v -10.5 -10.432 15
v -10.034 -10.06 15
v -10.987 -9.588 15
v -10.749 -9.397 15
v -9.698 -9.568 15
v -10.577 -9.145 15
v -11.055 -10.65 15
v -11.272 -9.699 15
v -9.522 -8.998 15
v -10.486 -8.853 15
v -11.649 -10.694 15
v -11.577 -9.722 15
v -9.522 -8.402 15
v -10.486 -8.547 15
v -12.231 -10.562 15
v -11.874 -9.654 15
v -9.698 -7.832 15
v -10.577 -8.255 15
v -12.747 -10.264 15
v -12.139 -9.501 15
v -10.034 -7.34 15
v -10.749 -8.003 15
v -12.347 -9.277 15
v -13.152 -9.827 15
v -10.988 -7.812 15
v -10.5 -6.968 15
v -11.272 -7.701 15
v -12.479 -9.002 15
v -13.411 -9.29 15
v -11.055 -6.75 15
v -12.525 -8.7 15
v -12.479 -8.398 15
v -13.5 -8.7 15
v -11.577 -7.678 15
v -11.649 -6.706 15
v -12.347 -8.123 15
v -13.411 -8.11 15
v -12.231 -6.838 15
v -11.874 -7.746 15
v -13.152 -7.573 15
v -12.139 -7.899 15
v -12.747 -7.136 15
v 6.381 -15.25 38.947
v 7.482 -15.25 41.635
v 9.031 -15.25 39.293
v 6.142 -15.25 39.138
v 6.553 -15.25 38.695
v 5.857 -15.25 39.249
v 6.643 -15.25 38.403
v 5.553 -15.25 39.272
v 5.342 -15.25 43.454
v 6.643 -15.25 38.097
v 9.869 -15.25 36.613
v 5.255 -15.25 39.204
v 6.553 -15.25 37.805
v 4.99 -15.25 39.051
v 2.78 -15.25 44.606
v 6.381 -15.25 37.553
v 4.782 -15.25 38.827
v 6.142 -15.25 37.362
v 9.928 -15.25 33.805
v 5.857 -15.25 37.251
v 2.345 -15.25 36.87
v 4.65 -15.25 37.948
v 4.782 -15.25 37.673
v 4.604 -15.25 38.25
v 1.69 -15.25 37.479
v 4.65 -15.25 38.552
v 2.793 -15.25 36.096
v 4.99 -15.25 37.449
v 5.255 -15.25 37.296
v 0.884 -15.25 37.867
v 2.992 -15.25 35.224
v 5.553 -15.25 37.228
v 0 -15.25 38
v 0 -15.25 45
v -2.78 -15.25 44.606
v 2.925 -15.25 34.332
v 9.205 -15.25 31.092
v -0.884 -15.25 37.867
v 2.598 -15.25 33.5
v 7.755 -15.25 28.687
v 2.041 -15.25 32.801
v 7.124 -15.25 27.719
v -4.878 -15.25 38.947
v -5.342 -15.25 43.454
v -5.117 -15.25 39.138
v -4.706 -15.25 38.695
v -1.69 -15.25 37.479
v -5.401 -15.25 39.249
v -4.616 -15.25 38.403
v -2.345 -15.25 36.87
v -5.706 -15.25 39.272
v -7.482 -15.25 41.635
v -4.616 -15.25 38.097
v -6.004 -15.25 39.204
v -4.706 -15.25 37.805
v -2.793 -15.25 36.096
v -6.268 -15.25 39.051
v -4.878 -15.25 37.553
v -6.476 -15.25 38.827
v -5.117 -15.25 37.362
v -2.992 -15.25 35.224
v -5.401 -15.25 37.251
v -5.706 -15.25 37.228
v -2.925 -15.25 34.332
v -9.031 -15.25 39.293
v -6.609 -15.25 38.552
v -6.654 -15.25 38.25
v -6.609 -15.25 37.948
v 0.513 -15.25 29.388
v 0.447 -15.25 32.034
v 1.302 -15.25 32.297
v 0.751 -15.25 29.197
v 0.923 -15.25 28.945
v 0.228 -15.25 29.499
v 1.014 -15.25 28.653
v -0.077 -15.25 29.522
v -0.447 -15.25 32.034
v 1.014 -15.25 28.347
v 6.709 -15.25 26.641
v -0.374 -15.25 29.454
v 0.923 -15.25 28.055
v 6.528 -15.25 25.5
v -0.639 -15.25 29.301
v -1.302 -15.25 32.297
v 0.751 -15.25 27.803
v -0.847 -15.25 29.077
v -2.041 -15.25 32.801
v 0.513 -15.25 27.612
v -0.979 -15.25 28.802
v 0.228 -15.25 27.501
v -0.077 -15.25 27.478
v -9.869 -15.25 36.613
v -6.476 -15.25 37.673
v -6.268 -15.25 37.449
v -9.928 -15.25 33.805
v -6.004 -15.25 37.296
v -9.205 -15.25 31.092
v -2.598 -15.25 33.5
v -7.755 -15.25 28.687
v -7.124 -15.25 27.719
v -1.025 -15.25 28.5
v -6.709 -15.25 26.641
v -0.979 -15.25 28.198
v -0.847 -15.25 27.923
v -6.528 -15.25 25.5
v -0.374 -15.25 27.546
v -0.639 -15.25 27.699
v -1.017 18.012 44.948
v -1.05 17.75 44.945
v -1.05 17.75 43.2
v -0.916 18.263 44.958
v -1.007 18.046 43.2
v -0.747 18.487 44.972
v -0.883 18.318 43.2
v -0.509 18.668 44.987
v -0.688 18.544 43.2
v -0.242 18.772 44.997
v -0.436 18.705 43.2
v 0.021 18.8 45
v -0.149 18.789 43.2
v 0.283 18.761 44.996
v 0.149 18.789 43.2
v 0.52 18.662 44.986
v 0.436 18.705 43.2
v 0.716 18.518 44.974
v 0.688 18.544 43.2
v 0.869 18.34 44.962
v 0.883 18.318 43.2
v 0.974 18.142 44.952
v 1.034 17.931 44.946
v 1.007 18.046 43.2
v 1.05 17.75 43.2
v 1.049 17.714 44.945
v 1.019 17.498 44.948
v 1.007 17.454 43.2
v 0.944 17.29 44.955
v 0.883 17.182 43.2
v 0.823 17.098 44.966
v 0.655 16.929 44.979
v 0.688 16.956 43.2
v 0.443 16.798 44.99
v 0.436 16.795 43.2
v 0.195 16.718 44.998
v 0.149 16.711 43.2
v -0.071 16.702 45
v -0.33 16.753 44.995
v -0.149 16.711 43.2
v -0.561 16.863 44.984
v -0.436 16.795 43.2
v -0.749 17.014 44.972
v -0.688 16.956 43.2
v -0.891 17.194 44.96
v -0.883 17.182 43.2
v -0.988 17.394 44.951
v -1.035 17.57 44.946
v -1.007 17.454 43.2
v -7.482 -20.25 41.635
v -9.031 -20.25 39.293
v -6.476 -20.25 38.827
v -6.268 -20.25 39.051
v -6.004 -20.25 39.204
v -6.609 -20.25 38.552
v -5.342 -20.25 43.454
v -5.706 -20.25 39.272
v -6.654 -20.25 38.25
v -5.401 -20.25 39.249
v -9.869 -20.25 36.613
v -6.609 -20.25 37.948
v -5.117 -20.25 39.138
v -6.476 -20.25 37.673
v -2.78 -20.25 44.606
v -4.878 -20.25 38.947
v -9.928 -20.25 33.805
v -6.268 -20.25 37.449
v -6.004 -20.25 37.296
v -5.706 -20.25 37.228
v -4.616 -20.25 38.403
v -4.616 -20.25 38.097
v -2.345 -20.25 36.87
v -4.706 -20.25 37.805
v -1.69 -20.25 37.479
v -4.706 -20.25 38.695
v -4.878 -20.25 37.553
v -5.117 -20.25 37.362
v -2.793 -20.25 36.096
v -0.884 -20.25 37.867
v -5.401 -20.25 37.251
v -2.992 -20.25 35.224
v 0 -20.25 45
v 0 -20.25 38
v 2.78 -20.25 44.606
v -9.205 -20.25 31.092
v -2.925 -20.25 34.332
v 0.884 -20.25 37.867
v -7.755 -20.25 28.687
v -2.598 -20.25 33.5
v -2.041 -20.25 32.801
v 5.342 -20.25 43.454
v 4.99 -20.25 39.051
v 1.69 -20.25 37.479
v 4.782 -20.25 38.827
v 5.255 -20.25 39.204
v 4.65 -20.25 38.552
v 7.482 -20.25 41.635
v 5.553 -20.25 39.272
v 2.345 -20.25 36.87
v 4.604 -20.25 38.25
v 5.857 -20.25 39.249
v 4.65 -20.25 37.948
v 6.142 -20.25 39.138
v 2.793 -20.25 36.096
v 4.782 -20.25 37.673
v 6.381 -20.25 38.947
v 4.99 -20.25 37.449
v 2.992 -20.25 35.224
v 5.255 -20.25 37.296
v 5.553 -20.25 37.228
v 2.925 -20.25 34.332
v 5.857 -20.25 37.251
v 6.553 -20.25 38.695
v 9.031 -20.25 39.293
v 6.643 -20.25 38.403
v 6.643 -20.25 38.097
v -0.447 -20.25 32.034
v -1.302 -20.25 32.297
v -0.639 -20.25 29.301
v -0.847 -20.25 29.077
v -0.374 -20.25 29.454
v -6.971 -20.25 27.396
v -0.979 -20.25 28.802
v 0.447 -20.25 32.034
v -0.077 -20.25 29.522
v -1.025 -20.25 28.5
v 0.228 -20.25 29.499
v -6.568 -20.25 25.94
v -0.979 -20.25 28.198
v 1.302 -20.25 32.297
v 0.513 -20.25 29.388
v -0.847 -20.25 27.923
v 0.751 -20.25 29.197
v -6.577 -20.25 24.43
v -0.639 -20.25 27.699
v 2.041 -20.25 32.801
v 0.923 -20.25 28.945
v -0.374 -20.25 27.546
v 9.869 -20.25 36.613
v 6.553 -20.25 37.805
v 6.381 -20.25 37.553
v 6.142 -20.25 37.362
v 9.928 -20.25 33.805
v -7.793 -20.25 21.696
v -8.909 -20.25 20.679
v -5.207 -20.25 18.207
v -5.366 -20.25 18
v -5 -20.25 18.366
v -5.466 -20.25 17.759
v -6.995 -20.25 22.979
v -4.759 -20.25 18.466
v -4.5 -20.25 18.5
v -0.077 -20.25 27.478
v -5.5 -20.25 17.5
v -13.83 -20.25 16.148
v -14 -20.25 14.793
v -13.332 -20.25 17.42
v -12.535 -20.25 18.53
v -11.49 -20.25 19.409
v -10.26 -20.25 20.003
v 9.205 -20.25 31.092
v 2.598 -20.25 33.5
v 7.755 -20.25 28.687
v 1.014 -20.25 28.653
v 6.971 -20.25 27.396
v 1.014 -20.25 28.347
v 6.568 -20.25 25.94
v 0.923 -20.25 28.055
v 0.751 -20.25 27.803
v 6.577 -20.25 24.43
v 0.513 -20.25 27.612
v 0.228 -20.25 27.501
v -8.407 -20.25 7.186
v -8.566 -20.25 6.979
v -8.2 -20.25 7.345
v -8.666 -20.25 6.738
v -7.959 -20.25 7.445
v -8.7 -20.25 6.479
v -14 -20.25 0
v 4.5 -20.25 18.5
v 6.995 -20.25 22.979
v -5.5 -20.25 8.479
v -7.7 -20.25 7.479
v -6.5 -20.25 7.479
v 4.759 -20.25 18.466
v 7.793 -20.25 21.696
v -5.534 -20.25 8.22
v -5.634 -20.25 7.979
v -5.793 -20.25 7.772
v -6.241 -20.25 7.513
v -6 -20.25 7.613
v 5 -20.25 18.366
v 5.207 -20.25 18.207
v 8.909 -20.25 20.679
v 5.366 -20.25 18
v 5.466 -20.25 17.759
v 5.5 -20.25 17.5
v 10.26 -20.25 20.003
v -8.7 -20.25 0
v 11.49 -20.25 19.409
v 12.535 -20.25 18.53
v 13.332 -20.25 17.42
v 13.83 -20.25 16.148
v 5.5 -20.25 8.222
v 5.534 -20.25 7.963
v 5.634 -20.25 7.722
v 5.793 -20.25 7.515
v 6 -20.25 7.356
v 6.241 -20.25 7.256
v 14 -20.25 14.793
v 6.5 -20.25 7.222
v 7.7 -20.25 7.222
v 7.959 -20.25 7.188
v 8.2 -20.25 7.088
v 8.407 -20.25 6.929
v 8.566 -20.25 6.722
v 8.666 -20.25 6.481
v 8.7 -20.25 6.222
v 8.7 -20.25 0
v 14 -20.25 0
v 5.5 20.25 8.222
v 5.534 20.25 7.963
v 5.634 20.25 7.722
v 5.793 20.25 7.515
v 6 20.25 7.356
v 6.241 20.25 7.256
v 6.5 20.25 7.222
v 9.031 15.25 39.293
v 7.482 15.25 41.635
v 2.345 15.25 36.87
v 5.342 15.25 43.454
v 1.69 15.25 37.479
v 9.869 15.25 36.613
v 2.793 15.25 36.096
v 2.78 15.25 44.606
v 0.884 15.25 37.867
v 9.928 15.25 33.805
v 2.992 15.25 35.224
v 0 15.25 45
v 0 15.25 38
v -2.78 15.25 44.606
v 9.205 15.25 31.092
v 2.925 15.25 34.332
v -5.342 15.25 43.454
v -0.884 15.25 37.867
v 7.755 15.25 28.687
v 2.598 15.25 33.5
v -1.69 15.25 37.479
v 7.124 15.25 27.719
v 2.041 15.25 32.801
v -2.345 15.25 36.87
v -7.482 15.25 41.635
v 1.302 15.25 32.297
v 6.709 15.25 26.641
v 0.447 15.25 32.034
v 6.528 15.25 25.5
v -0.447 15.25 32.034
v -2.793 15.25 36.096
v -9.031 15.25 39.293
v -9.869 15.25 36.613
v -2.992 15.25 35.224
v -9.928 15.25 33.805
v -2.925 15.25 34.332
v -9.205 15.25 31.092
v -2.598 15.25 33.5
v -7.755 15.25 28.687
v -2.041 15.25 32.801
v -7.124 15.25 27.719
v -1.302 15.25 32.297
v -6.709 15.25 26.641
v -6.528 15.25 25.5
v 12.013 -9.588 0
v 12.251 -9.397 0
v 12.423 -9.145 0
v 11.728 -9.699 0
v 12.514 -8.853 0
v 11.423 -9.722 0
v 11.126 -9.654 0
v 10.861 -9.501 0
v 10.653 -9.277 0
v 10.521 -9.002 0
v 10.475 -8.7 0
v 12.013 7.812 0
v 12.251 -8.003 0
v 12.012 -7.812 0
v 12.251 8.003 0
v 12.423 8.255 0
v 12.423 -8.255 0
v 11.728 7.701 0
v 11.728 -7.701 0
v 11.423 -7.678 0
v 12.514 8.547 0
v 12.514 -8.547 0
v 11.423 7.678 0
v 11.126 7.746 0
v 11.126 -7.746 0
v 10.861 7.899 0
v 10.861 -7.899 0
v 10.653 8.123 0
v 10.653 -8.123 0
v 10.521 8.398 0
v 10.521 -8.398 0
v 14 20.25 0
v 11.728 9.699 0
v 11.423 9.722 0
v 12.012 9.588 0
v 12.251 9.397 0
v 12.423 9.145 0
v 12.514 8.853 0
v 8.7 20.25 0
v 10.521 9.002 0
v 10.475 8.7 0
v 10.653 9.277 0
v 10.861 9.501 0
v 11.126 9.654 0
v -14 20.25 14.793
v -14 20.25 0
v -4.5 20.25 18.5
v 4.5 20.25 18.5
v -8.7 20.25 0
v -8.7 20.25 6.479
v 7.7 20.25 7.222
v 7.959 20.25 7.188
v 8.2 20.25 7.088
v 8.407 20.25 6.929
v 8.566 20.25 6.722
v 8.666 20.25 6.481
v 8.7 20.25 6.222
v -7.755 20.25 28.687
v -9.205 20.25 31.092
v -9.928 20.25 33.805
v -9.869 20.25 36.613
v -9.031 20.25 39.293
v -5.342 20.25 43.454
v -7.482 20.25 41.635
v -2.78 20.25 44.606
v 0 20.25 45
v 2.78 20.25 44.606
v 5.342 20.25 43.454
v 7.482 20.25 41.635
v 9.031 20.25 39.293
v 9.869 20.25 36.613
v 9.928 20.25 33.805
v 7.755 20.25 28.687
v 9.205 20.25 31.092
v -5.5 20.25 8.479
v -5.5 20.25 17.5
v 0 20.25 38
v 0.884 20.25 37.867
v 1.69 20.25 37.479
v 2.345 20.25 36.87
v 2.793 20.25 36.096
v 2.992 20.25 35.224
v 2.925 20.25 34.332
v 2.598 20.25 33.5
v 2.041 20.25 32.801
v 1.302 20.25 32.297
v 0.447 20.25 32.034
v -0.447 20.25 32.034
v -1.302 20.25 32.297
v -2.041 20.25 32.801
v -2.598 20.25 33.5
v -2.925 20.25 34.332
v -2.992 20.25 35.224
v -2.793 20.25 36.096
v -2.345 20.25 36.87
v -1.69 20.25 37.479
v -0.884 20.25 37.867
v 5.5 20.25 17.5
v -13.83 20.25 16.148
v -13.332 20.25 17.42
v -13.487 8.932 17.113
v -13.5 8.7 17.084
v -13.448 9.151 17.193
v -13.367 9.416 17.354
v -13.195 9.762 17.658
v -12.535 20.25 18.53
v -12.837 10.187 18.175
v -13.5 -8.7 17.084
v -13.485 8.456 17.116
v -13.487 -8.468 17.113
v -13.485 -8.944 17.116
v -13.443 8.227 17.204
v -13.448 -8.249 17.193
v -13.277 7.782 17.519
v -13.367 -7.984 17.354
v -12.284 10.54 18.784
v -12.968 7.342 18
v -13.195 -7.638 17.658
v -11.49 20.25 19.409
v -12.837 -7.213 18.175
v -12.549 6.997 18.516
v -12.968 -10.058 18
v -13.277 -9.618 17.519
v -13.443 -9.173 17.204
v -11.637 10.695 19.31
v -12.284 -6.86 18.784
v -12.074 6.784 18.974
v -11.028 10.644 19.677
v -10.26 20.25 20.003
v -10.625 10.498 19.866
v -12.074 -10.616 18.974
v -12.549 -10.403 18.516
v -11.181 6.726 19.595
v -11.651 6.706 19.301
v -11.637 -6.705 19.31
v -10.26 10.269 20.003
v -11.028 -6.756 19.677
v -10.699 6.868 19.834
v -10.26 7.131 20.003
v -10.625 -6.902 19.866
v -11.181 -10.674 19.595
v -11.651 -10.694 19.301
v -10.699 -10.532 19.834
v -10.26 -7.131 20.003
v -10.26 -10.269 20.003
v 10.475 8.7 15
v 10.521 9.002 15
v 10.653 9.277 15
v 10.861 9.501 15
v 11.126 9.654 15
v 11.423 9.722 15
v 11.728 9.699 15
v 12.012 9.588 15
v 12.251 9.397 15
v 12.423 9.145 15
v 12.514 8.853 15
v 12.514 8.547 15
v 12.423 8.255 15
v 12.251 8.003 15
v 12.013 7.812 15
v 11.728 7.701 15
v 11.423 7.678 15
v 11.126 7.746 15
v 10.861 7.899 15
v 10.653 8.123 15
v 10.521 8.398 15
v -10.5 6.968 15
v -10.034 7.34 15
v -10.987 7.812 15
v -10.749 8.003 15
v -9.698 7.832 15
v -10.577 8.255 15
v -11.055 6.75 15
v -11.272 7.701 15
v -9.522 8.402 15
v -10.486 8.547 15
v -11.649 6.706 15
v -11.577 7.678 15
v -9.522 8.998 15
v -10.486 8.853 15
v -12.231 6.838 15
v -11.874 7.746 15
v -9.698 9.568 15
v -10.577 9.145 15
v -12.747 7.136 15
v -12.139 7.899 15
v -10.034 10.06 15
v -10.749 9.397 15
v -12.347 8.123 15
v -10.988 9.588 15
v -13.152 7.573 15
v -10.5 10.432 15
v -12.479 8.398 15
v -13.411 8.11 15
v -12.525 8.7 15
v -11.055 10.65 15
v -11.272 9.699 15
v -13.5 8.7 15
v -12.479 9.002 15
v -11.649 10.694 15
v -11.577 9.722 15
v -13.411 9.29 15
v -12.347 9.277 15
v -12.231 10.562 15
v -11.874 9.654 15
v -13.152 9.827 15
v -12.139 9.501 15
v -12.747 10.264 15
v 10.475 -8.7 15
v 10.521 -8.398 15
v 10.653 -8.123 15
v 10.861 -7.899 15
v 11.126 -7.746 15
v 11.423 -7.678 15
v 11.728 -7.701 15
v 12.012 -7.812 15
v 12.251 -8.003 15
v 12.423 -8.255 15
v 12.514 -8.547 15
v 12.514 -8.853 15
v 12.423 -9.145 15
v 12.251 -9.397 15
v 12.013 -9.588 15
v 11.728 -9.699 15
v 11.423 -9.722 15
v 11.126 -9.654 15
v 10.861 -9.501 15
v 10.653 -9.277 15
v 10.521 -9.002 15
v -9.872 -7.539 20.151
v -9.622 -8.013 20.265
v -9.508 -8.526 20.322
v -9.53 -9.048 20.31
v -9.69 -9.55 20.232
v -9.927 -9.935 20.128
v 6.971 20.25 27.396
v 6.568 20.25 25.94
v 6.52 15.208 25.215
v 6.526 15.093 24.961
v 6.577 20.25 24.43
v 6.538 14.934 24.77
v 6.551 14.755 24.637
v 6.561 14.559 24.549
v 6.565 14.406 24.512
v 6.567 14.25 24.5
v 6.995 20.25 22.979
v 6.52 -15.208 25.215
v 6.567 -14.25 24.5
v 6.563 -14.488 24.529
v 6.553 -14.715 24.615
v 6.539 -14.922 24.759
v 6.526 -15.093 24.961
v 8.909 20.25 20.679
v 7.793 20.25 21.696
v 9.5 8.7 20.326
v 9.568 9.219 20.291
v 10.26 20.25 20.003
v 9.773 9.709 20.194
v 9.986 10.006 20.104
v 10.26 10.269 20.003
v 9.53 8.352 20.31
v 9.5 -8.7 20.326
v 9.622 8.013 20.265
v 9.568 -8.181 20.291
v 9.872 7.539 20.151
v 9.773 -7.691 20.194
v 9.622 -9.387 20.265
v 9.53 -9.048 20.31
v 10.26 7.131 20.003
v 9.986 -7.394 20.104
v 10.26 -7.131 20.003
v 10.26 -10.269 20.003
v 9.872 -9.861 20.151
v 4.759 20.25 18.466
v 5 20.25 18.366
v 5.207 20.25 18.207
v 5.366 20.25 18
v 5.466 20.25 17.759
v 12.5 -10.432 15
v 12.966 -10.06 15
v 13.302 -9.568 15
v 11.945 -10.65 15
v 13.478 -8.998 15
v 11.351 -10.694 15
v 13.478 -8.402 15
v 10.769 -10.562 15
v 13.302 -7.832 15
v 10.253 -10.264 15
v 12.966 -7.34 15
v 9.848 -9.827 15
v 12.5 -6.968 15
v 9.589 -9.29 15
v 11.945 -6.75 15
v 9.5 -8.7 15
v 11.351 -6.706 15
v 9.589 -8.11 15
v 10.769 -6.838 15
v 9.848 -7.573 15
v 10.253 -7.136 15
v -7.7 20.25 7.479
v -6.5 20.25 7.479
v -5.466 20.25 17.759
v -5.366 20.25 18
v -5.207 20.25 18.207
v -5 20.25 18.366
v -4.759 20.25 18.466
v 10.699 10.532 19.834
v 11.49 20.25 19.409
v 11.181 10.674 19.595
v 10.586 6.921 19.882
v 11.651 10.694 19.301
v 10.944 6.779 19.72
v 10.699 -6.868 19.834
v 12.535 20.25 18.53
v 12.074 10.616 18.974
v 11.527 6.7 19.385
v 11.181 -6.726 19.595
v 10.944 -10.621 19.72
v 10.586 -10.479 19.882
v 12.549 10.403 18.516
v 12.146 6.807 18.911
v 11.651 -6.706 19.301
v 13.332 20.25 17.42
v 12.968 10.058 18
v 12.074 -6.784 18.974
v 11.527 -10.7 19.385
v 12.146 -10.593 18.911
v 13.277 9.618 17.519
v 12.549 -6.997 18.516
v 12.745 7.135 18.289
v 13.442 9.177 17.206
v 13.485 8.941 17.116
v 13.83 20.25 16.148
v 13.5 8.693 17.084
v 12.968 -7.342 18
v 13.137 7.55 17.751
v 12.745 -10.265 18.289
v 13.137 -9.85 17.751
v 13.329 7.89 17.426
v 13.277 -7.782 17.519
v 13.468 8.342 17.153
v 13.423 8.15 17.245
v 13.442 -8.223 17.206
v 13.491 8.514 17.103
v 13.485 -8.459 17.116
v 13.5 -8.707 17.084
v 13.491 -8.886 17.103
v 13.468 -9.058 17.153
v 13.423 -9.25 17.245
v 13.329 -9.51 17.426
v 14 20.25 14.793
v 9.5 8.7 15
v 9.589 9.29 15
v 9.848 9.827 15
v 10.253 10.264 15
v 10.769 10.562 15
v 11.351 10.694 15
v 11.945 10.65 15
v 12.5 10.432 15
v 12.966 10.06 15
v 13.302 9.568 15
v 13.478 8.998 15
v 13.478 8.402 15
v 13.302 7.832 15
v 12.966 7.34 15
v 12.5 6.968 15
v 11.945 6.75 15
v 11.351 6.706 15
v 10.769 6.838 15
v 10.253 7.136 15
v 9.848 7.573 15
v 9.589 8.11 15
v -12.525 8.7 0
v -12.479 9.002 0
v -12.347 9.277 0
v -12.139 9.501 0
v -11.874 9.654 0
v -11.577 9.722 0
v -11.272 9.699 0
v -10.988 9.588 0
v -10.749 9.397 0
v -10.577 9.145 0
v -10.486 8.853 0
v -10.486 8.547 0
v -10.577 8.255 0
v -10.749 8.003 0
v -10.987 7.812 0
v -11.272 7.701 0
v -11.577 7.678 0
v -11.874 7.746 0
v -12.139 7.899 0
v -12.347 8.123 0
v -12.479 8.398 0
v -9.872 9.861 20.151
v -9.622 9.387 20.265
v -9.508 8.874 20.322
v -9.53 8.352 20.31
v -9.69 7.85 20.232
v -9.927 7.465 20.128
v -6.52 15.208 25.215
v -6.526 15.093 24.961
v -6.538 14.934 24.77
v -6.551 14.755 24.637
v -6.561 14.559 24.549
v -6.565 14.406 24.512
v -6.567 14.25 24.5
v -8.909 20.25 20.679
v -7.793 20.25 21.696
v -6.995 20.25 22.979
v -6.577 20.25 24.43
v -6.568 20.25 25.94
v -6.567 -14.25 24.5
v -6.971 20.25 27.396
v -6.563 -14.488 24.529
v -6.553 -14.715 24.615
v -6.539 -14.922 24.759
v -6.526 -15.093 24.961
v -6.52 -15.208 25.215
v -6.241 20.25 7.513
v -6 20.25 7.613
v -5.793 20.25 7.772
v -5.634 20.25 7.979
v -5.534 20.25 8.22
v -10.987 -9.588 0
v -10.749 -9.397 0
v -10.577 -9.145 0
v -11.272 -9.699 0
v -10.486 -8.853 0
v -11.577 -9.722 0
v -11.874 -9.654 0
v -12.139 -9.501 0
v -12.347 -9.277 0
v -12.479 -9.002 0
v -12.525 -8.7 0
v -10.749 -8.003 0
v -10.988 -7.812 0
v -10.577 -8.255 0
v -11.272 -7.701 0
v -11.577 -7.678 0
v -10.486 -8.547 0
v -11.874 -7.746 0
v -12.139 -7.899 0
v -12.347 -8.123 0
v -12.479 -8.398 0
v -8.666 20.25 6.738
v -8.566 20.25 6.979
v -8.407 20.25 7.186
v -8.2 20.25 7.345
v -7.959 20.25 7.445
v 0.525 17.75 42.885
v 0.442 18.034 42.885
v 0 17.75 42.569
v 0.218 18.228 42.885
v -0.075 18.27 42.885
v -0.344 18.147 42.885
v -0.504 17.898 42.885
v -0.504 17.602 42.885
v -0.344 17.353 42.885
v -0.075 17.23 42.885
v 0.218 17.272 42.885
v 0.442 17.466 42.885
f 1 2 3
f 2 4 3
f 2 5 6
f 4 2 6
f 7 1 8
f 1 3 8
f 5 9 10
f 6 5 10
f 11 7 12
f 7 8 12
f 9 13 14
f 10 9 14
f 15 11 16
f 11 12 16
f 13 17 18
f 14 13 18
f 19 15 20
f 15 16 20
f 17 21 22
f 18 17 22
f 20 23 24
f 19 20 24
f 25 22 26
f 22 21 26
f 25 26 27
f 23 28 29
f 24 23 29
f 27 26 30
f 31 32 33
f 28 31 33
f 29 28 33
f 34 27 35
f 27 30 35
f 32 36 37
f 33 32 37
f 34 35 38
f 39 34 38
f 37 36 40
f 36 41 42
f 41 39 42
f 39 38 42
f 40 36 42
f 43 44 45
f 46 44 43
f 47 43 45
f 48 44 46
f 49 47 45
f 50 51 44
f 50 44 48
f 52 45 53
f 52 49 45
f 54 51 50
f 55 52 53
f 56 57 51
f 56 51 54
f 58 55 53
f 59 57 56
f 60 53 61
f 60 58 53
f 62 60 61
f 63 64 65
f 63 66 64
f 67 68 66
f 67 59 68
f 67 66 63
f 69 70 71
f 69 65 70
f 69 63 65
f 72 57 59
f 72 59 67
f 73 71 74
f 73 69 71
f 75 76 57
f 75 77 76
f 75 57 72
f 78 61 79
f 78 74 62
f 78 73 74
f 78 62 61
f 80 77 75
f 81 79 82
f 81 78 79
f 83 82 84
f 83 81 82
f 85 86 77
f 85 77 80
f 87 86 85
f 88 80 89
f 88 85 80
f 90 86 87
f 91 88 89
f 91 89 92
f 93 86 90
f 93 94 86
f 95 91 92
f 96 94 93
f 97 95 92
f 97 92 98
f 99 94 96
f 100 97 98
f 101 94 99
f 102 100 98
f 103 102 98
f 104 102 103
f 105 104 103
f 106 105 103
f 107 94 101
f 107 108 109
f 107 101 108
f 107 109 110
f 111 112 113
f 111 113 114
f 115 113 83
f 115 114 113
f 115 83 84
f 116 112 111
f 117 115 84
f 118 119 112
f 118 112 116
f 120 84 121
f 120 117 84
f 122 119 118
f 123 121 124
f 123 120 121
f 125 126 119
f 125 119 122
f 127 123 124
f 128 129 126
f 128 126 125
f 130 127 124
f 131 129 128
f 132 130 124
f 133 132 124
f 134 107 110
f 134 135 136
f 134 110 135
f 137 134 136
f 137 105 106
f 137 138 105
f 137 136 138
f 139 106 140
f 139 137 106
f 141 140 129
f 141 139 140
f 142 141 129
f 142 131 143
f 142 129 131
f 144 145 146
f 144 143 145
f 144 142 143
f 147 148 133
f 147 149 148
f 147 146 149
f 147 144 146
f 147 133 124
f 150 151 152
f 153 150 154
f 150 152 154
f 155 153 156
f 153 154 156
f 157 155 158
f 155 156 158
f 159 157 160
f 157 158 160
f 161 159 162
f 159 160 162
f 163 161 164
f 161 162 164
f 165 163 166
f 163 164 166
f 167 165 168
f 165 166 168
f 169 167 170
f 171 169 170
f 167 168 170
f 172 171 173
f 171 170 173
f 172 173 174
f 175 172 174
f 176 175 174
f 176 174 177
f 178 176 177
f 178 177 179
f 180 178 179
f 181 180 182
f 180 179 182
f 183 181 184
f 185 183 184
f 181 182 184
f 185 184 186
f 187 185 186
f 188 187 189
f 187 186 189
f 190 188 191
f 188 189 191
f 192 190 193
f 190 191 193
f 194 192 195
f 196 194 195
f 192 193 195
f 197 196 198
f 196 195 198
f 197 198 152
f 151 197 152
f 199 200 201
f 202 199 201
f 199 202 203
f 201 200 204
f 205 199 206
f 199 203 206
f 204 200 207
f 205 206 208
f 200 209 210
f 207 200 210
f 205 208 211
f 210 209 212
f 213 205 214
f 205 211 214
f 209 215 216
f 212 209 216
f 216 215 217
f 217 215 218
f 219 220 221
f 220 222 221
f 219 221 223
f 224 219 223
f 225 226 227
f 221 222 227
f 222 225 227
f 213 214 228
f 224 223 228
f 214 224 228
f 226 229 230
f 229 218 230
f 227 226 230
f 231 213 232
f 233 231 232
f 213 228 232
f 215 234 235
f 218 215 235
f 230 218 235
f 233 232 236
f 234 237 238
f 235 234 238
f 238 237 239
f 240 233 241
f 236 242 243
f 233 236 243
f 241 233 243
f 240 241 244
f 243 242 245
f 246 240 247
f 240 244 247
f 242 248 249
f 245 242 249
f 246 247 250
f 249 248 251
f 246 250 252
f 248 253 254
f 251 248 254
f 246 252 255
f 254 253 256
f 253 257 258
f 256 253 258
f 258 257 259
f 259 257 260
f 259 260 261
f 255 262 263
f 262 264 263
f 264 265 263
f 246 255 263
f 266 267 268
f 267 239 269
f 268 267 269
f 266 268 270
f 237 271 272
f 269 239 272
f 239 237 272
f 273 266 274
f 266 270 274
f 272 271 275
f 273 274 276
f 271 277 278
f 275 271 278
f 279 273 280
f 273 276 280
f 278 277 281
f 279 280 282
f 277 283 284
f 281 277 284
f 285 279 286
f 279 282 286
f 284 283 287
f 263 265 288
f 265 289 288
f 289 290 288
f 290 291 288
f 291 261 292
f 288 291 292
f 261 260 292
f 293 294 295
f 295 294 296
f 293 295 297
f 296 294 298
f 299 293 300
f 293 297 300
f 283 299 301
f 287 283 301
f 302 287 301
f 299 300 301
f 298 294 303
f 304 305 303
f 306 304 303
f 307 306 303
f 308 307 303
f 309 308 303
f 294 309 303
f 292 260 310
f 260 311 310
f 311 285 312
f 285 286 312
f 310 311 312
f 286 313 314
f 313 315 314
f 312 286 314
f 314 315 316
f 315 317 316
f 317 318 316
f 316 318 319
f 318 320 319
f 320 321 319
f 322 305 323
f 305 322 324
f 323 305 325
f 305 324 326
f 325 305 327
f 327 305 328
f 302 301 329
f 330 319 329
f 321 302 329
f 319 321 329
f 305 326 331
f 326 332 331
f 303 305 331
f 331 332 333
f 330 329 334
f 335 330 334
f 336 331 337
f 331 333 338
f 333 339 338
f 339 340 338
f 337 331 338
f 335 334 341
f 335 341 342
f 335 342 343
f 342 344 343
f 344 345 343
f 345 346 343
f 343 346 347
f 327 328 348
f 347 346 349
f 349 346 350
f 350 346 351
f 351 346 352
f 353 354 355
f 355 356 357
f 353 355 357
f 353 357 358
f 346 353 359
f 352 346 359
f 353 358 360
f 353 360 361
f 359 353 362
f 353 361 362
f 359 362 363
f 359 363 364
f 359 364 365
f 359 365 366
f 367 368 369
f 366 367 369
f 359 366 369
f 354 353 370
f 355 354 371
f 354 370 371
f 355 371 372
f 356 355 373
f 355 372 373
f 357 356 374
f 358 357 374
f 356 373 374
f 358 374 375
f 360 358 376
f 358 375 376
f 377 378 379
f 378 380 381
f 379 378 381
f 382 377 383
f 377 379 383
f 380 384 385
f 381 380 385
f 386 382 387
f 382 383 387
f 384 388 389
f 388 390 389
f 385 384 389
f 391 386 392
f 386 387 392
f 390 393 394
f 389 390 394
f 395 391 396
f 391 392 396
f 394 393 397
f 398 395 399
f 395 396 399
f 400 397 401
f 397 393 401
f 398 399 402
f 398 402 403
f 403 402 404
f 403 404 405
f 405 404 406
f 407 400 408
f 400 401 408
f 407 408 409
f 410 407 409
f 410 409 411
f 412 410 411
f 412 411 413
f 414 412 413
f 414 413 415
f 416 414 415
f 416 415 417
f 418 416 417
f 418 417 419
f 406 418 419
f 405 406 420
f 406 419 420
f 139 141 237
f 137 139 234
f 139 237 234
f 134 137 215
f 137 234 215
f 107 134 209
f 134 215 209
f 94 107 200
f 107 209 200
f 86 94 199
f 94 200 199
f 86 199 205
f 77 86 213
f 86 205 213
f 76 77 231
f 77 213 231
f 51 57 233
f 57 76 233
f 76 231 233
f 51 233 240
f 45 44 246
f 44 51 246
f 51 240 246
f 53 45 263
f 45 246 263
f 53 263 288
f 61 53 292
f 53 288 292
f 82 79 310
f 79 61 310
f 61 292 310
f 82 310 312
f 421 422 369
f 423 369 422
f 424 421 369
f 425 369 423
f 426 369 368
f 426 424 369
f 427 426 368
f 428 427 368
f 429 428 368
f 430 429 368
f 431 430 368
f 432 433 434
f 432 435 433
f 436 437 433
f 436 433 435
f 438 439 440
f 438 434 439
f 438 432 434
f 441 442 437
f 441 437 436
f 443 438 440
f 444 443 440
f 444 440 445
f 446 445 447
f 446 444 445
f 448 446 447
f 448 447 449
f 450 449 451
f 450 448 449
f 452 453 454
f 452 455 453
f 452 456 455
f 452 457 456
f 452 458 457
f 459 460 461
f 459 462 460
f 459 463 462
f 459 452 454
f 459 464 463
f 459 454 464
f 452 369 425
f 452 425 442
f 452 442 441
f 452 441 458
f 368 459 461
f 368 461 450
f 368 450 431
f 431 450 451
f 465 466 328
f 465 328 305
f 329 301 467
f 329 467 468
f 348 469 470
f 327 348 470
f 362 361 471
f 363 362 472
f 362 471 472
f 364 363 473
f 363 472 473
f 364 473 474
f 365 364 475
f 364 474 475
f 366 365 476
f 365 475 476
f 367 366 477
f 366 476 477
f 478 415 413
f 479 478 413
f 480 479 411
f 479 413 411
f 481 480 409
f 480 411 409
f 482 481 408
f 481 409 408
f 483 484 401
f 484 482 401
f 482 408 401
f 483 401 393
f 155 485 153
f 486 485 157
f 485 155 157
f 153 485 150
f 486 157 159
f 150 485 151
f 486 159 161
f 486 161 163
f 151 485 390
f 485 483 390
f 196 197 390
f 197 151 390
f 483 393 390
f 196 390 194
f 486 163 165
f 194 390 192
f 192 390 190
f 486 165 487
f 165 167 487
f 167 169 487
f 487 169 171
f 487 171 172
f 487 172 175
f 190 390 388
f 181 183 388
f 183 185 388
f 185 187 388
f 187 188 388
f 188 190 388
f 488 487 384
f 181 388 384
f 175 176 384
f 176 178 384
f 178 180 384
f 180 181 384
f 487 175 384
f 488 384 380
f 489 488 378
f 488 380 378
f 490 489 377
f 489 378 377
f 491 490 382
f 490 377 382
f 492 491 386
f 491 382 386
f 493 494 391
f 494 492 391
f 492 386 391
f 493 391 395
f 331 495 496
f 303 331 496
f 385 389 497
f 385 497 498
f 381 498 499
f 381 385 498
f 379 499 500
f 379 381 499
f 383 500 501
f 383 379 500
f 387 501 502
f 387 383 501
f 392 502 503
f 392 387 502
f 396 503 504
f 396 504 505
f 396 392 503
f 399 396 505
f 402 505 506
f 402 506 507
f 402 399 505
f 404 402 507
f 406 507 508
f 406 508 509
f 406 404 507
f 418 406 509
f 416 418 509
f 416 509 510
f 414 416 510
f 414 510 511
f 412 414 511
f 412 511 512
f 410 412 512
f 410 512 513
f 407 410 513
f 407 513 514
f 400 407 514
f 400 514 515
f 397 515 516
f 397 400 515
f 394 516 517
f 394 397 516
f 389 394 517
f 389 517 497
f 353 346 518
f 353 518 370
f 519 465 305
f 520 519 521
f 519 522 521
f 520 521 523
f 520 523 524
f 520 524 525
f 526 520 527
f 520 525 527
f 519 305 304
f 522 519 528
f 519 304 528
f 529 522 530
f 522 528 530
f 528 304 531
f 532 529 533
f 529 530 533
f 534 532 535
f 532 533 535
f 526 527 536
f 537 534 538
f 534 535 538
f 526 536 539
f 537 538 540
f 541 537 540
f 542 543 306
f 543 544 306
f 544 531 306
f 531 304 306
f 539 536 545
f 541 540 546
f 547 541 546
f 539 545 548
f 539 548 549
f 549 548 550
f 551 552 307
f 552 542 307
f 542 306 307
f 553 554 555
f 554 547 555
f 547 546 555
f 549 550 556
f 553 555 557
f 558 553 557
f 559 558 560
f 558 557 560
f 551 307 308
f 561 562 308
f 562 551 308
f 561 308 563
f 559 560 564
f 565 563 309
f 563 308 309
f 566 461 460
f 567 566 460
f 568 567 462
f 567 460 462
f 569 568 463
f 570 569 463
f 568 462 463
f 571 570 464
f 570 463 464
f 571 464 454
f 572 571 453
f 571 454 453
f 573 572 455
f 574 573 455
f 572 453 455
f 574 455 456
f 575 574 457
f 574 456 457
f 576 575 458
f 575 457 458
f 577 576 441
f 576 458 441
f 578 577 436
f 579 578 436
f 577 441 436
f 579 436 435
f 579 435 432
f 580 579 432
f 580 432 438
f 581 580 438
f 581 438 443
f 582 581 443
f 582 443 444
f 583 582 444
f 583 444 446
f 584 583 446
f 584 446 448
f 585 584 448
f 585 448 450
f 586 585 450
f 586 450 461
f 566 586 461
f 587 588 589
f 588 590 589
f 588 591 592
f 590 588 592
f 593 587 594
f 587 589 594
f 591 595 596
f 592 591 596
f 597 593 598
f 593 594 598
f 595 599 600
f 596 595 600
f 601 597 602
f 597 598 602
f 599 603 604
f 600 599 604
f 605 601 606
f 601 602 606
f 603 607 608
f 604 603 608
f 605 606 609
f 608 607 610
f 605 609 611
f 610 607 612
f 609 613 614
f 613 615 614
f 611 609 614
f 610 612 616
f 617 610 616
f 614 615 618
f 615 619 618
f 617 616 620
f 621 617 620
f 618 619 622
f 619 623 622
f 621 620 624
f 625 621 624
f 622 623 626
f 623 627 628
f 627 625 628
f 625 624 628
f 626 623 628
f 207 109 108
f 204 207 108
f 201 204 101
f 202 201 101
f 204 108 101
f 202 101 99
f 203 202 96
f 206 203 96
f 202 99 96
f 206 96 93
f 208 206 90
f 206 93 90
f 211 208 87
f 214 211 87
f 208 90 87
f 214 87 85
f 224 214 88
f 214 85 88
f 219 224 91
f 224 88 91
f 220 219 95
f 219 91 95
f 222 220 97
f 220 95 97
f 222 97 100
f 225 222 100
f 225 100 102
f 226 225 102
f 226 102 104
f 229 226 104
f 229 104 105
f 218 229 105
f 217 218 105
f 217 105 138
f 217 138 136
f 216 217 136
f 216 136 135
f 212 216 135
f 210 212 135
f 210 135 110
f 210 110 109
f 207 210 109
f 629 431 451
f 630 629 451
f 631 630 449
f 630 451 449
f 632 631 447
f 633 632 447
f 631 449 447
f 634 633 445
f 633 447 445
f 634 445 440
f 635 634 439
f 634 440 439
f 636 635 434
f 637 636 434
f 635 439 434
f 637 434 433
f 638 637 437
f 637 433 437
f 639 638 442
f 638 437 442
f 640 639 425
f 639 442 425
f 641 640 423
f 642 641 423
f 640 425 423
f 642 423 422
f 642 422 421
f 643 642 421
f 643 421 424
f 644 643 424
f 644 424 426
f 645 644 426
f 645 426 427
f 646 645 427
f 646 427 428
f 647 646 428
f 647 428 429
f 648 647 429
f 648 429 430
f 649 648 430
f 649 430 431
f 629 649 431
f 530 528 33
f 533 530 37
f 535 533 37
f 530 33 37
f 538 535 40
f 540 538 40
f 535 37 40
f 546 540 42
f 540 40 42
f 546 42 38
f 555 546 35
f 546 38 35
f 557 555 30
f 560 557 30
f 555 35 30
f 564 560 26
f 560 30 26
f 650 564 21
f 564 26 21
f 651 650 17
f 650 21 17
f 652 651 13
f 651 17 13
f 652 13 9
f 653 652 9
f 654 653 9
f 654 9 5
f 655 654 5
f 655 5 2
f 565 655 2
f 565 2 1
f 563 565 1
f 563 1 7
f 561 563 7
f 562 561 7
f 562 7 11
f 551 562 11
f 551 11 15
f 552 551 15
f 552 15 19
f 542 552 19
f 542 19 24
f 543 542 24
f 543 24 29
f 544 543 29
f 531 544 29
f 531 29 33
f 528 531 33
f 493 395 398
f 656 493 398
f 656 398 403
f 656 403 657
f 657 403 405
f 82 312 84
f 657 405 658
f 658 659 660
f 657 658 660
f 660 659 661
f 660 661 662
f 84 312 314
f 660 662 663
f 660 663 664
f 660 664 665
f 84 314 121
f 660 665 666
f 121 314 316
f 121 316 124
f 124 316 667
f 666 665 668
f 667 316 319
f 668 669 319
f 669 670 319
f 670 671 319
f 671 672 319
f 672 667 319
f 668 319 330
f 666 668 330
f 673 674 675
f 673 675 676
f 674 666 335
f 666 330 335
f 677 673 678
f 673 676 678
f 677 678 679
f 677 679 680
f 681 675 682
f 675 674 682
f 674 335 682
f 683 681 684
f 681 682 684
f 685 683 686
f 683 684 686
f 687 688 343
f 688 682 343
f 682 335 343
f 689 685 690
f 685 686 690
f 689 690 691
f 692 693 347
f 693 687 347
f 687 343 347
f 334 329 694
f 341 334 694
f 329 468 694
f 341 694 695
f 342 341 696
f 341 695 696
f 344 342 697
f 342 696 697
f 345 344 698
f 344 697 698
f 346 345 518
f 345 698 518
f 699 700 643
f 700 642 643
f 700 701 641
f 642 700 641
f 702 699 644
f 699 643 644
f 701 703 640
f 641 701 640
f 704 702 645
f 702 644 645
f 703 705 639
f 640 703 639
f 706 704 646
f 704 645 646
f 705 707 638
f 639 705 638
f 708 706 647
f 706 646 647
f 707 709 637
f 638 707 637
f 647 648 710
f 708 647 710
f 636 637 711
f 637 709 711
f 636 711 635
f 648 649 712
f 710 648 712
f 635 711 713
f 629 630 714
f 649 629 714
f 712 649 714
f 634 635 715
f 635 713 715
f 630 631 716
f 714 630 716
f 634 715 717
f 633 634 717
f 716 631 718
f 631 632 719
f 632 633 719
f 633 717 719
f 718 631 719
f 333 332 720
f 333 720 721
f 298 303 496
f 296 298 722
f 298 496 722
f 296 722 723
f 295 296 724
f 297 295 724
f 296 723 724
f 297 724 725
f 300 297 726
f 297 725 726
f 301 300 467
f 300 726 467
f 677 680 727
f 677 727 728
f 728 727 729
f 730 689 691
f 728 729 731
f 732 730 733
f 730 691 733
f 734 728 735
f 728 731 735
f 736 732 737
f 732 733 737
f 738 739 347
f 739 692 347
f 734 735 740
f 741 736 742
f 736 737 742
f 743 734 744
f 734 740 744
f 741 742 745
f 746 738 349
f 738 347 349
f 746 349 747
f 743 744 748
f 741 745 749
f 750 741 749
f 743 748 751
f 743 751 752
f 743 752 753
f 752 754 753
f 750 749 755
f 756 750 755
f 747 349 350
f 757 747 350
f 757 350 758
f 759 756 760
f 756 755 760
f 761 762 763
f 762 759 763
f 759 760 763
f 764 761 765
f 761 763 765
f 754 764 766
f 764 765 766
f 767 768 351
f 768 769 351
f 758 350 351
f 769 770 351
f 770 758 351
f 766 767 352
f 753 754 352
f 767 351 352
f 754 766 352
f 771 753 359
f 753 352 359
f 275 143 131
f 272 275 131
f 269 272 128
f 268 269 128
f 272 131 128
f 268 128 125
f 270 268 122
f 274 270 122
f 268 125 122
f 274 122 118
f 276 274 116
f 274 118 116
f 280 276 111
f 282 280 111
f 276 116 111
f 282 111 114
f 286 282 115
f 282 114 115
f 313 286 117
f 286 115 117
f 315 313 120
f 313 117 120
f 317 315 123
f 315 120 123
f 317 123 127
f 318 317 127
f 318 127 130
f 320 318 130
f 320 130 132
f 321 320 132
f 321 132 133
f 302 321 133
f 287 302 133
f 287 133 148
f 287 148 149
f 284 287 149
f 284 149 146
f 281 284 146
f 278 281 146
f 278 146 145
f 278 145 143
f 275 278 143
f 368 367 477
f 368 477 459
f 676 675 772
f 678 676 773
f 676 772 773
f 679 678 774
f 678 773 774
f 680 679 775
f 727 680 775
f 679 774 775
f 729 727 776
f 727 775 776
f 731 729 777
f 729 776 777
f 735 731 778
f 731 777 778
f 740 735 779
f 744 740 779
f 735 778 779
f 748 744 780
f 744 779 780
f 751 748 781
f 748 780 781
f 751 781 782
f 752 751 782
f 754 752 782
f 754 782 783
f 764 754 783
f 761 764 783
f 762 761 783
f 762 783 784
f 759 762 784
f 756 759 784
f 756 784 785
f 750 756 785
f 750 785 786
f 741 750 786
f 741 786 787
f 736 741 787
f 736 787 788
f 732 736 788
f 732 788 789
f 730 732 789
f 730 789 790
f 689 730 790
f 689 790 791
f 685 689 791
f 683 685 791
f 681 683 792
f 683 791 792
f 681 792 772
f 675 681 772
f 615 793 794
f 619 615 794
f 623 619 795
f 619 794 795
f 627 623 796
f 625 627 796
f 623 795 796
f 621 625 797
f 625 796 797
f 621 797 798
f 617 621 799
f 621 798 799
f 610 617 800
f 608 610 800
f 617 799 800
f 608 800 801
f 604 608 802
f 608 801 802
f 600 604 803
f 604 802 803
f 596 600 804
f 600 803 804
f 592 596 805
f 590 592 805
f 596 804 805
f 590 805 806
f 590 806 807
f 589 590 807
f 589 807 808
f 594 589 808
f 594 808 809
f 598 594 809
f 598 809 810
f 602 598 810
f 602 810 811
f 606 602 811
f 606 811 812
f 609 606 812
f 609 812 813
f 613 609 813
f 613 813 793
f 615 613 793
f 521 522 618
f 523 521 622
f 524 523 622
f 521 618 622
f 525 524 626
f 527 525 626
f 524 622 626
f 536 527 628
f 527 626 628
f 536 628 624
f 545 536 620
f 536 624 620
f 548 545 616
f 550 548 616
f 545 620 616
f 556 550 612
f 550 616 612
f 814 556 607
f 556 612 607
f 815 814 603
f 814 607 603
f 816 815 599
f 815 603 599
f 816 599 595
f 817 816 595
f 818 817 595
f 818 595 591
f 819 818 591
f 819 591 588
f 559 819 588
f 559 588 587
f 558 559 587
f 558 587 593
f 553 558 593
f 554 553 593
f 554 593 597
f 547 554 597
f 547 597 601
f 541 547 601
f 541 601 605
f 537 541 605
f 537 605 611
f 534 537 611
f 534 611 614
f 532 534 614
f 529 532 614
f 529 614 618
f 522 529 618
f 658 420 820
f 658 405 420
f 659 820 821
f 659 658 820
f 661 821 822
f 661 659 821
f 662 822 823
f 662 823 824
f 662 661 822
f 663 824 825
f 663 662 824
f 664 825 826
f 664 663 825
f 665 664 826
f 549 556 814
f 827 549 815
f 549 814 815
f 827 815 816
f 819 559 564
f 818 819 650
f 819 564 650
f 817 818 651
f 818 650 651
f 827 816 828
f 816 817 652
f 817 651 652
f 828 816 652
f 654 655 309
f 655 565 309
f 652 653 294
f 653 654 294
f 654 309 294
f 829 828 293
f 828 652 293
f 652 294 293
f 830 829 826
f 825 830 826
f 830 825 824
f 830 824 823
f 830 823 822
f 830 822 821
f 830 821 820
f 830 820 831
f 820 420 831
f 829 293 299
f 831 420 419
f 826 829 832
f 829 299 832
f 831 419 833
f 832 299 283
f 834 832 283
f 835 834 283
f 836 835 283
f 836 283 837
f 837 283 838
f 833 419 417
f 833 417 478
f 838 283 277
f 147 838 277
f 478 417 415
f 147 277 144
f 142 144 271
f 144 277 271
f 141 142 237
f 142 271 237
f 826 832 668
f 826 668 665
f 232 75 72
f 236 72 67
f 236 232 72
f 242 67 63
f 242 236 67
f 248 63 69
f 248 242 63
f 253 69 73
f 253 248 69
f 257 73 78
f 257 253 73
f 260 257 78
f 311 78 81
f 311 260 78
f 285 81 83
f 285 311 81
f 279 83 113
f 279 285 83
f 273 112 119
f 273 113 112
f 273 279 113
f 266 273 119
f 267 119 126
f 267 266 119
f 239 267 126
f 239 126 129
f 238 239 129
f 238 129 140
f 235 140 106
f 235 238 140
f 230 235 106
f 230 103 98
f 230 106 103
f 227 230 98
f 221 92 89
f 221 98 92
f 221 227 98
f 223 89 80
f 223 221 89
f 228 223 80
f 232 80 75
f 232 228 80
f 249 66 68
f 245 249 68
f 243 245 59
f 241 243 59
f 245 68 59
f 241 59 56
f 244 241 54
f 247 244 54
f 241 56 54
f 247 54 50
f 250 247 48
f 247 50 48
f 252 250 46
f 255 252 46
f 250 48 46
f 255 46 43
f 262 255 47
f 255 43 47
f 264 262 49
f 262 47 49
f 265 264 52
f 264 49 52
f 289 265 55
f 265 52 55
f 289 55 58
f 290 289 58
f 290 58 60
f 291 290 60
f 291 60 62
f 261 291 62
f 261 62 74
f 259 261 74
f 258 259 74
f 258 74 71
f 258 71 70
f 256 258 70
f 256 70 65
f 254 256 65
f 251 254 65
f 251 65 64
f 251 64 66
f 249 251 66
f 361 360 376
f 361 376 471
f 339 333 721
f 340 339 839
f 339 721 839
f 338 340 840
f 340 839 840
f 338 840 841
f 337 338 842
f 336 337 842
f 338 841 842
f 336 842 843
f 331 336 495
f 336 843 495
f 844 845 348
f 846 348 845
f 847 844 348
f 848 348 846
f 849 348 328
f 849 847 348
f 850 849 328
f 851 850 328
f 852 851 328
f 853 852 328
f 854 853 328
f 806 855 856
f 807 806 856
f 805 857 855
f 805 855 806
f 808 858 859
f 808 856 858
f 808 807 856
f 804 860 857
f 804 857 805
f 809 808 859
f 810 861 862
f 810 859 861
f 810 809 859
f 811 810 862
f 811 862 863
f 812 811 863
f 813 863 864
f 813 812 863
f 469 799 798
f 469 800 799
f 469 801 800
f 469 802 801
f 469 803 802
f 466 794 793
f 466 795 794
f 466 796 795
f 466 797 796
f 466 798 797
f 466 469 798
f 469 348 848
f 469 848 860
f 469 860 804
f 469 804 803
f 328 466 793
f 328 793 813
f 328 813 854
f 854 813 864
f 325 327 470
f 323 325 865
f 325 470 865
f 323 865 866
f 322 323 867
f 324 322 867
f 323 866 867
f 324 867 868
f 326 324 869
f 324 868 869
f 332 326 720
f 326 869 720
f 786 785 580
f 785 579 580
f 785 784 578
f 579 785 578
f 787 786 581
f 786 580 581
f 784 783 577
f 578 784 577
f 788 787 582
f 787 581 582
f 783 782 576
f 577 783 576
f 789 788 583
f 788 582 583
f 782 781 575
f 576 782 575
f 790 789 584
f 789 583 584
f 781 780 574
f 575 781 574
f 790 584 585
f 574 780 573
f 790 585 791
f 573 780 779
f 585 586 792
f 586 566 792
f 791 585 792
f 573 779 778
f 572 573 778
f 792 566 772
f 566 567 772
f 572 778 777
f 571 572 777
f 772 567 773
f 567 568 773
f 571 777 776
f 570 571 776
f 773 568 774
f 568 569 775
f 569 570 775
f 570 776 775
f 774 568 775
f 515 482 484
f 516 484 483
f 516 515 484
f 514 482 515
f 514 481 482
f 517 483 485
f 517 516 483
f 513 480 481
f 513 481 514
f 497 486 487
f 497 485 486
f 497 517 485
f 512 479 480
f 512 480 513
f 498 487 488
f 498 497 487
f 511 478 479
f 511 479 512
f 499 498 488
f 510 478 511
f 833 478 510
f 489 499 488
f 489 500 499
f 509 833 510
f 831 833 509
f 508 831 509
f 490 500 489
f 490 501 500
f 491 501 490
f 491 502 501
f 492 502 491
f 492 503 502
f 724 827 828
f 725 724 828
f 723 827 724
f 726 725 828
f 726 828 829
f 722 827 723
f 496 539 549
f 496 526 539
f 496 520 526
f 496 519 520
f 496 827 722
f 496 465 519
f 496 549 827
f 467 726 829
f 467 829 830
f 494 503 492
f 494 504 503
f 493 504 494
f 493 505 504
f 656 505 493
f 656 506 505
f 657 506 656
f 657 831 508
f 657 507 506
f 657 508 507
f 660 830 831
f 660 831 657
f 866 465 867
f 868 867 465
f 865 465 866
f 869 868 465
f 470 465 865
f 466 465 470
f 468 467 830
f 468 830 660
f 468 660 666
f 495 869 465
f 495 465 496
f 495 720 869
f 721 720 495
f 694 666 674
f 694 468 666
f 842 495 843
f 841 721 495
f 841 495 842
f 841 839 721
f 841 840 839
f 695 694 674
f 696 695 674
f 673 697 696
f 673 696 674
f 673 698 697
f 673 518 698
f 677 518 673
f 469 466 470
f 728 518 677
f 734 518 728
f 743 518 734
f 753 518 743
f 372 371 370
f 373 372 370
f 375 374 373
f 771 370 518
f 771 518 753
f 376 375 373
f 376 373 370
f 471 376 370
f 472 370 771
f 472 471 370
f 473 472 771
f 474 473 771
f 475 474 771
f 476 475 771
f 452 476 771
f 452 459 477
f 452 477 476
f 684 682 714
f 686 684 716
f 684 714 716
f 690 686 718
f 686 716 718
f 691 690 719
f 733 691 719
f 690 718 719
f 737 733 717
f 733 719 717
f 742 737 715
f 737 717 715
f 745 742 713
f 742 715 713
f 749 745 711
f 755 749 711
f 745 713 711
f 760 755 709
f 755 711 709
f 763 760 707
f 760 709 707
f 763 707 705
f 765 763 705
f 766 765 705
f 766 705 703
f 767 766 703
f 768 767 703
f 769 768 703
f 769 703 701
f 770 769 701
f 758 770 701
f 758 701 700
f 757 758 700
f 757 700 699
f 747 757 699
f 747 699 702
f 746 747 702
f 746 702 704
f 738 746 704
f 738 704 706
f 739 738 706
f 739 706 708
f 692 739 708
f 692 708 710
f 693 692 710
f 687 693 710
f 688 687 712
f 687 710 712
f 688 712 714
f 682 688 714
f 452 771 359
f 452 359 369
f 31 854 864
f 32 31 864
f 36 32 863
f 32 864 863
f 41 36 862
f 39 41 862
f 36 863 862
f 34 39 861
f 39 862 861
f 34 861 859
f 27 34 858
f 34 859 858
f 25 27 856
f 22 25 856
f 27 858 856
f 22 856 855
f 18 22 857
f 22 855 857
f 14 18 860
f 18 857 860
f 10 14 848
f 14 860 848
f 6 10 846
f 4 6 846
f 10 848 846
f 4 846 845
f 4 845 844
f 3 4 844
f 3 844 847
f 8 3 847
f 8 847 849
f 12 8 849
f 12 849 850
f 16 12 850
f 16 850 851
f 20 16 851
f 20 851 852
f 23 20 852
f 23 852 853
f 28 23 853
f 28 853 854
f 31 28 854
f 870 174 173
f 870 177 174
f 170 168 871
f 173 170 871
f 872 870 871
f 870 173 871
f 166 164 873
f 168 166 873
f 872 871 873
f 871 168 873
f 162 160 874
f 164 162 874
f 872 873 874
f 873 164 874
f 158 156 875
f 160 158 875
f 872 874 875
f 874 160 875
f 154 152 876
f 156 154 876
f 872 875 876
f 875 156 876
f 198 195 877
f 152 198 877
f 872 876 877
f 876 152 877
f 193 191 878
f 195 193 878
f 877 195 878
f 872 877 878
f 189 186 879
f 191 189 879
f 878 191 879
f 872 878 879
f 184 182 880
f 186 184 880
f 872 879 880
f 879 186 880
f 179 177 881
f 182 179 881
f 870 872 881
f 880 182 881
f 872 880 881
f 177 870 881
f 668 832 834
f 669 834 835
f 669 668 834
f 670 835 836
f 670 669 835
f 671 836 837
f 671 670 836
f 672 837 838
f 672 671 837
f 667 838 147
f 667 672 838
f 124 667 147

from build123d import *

# Parameters (mm, degrees)
ESQUISSE3_R                         = 3
BOSS_EXTRU_1_DEPTH                  = 20.25
ENL_V_MAT_EXTRU_2_DEPTH             = 55.83668936
ENL_V_MAT_EXTRU_2_DEPTH_BACK        = 55.83668936
ESQUISSE5_W                         = 24.5
ESQUISSE5_H                         = 30.5
ENL_V_MAT_EXTRU_3_DEPTH             = 66.094162565
ENL_V_MAT_EXTRU_3_DEPTH_BACK        = 66.094162565
ENL_V_MAT_EXTRU_6_DEPTH             = 66.094162565
TROU_TARAUD_M2_51_D                 = 2.05
TROU_TARAUD_M2_51_DEPTH             = 5
DIAM_TRE_DU_PER_AGE_2_1_2_1_1_D     = 2.1
DIAM_TRE_DU_PER_AGE_2_1_2_1_1_DEPTH = 1.8
DIAM_TRE_DU_PER_AGE_2_1_2_1_1_TIP   = 0.63090365
ESQUISSE16_R                        = 1.025
ENL_V_MAT_EXTRU_7_DEPTH             = 52.293883791
ENL_V_START                         = -15
ESQUISSE17_R                        = 2
ENL_V_MAT_EXTRU_9_DEPTH             = 10
CONG_1_R                            = 1


with BuildPart() as part:
    # Esquisse3 → Boss.-Extru.1 (new, symmetric)
    with BuildSketch(Plane(origin=(0, 0, 0), x_dir=(1, 0, 0), z_dir=(0, 1, 0))):
        with BuildLine():
            Line((-14, 0), (-14, -35))
            ThreePointArc((-14, -35), (0, -49), (14, -35))
            Line((14, -35), (14, 0))
            Line((14, 0), (-14, 0))
        make_face()
        with Locations(Location((0, -35, 0), (0, 0, 270))):
            Circle(ESQUISSE3_R, mode=Mode.SUBTRACT)
    extrude(amount=BOSS_EXTRU_1_DEPTH, both=True)

    # Esquisse5 → Enlèv. mat.-Extru.2 (cut, two sides: drawn at the far end of the back side and taken through both)
    with BuildSketch(Plane(origin=(0, 0, 0), x_dir=(0, 0, -1), z_dir=(1, 0, 0)).offset(-ENL_V_MAT_EXTRU_2_DEPTH_BACK)):
        with Locations((-36.75, 0)):
            Rectangle(ESQUISSE5_W, ESQUISSE5_H)
    extrude(amount=ENL_V_MAT_EXTRU_2_DEPTH + ENL_V_MAT_EXTRU_2_DEPTH_BACK, mode=Mode.SUBTRACT)

    # Esquisse6 → Enlèv. mat.-Extru.3 (cut, two sides: drawn at the far end of the back side and taken through both)
    with BuildSketch(Plane(origin=(0, -20.25, 0), x_dir=(1, 0, 0), z_dir=(0, 1, 0)).offset(-ENL_V_MAT_EXTRU_3_DEPTH_BACK)):
        Polygon((-8.7, 0), (-8.7, -7.479156707), (-5.5, -7.479156707), (-5.5, -18.5), (5.5, -18.5), (5.5, -7.221861732), (8.7, -7.221861732), (8.7, 0), align=None)
    extrude(amount=ENL_V_MAT_EXTRU_3_DEPTH + ENL_V_MAT_EXTRU_3_DEPTH_BACK, mode=Mode.SUBTRACT)

    # Esquisse11 → Enlèv. mat.-Extru.6 (cut, through all)
    with BuildSketch(Plane.XZ.offset(20.25)):
        with BuildLine():
            Line((14, 14.792740578), (14, 35))
            ThreePointArc((14, 35), (0, 49), (-14, 35))
            Line((-14, 35), (-14, 14.792740578))
            ThreePointArc((-14, 14.792740578), (-12.968272988, 17.999691858), (-10.260168543, 20.003480132))
            ThreePointArc((-10.260168543, 20.003480132), (-6.735867006, 23.689629257), (-7.755056184, 28.686593346))
            ThreePointArc((-7.755056184, 28.686593346), (0, 45), (7.755056184, 28.686593346))
            ThreePointArc((7.755056184, 28.686593346), (6.735867006, 23.689629257), (10.260168543, 20.003480132))
            ThreePointArc((10.260168543, 20.003480132), (12.968272988, 17.999691858), (14, 14.792740578))
        make_face()
    extrude(amount=-ENL_V_MAT_EXTRU_6_DEPTH, mode=Mode.SUBTRACT)

    # Trou taraudé M2.51
    with Locations(Plane.XZ.offset(20.25)):
        with Locations((0, 28.5), (-5.629165125, 38.25), (5.629165125, 38.25)):
            Hole(TROU_TARAUD_M2_51_D / 2, depth=TROU_TARAUD_M2_51_DEPTH)

    # Diamètre du perçage Ø2.1 (2.1)1
    with Locations(Plane.XY.offset(45)):
        with Locations((0, 17.75)):
            Hole(DIAM_TRE_DU_PER_AGE_2_1_2_1_1_D / 2, depth=DIAM_TRE_DU_PER_AGE_2_1_2_1_1_DEPTH)
            with Locations((0, 0, -(DIAM_TRE_DU_PER_AGE_2_1_2_1_1_DEPTH + DIAM_TRE_DU_PER_AGE_2_1_2_1_1_TIP / 2))):  # 118° drill point
                Cone(0, DIAM_TRE_DU_PER_AGE_2_1_2_1_1_D / 2, DIAM_TRE_DU_PER_AGE_2_1_2_1_1_TIP, mode=Mode.SUBTRACT)

    # Esquisse16 → Enlèv. mat.-Extru.7 (cut, through all)
    with BuildSketch(Plane(origin=(0, 0, 0), x_dir=(-1, 0, 0), z_dir=(0, 0, -1))):
        with Locations((-11.5, 8.7)):
            Circle(ESQUISSE16_R)
        with Locations((11.5, 8.7)):
            Circle(ESQUISSE16_R)
        with Locations((-11.5, -8.7)):
            Circle(ESQUISSE16_R)
        with Locations((11.5, -8.7)):
            Circle(ESQUISSE16_R)
    extrude(amount=-ENL_V_MAT_EXTRU_7_DEPTH, mode=Mode.SUBTRACT)

    # Esquisse17 → Enlèv. mat.-Extru.9 (cut)
    with BuildSketch(Plane(origin=(0, 0, 0), x_dir=(-1, 0, 0), z_dir=(0, 0, -1)).offset(ENL_V_START)):
        with Locations((11.5, 8.7)):
            Circle(ESQUISSE17_R)
        with Locations((11.5, -8.7)):
            Circle(ESQUISSE17_R)
        with Locations((-11.5, -8.7)):
            Circle(ESQUISSE17_R)
        with Locations((-11.5, 8.7)):
            Circle(ESQUISSE17_R)
    extrude(amount=-ENL_V_MAT_EXTRU_9_DEPTH, mode=Mode.SUBTRACT)

    # Congé1
    cong_1_edges = [part.edges().sort_by_distance(p)[0] for p in [
        (5.5, 0, 7.221861732),
        (5.5, 0, 18.5),
        (-5.5, 0, 18.5),
        (-5.5, 0, 7.479156707),
        (8.7, 0, 7.221861732),
        (-8.7, 0, 7.479156707),
        (0, 15.25, 24.5),
        (0, -15.25, 24.5),
    ]]
    fillet(cong_1_edges, radius=CONG_1_R)


solid = part.part
